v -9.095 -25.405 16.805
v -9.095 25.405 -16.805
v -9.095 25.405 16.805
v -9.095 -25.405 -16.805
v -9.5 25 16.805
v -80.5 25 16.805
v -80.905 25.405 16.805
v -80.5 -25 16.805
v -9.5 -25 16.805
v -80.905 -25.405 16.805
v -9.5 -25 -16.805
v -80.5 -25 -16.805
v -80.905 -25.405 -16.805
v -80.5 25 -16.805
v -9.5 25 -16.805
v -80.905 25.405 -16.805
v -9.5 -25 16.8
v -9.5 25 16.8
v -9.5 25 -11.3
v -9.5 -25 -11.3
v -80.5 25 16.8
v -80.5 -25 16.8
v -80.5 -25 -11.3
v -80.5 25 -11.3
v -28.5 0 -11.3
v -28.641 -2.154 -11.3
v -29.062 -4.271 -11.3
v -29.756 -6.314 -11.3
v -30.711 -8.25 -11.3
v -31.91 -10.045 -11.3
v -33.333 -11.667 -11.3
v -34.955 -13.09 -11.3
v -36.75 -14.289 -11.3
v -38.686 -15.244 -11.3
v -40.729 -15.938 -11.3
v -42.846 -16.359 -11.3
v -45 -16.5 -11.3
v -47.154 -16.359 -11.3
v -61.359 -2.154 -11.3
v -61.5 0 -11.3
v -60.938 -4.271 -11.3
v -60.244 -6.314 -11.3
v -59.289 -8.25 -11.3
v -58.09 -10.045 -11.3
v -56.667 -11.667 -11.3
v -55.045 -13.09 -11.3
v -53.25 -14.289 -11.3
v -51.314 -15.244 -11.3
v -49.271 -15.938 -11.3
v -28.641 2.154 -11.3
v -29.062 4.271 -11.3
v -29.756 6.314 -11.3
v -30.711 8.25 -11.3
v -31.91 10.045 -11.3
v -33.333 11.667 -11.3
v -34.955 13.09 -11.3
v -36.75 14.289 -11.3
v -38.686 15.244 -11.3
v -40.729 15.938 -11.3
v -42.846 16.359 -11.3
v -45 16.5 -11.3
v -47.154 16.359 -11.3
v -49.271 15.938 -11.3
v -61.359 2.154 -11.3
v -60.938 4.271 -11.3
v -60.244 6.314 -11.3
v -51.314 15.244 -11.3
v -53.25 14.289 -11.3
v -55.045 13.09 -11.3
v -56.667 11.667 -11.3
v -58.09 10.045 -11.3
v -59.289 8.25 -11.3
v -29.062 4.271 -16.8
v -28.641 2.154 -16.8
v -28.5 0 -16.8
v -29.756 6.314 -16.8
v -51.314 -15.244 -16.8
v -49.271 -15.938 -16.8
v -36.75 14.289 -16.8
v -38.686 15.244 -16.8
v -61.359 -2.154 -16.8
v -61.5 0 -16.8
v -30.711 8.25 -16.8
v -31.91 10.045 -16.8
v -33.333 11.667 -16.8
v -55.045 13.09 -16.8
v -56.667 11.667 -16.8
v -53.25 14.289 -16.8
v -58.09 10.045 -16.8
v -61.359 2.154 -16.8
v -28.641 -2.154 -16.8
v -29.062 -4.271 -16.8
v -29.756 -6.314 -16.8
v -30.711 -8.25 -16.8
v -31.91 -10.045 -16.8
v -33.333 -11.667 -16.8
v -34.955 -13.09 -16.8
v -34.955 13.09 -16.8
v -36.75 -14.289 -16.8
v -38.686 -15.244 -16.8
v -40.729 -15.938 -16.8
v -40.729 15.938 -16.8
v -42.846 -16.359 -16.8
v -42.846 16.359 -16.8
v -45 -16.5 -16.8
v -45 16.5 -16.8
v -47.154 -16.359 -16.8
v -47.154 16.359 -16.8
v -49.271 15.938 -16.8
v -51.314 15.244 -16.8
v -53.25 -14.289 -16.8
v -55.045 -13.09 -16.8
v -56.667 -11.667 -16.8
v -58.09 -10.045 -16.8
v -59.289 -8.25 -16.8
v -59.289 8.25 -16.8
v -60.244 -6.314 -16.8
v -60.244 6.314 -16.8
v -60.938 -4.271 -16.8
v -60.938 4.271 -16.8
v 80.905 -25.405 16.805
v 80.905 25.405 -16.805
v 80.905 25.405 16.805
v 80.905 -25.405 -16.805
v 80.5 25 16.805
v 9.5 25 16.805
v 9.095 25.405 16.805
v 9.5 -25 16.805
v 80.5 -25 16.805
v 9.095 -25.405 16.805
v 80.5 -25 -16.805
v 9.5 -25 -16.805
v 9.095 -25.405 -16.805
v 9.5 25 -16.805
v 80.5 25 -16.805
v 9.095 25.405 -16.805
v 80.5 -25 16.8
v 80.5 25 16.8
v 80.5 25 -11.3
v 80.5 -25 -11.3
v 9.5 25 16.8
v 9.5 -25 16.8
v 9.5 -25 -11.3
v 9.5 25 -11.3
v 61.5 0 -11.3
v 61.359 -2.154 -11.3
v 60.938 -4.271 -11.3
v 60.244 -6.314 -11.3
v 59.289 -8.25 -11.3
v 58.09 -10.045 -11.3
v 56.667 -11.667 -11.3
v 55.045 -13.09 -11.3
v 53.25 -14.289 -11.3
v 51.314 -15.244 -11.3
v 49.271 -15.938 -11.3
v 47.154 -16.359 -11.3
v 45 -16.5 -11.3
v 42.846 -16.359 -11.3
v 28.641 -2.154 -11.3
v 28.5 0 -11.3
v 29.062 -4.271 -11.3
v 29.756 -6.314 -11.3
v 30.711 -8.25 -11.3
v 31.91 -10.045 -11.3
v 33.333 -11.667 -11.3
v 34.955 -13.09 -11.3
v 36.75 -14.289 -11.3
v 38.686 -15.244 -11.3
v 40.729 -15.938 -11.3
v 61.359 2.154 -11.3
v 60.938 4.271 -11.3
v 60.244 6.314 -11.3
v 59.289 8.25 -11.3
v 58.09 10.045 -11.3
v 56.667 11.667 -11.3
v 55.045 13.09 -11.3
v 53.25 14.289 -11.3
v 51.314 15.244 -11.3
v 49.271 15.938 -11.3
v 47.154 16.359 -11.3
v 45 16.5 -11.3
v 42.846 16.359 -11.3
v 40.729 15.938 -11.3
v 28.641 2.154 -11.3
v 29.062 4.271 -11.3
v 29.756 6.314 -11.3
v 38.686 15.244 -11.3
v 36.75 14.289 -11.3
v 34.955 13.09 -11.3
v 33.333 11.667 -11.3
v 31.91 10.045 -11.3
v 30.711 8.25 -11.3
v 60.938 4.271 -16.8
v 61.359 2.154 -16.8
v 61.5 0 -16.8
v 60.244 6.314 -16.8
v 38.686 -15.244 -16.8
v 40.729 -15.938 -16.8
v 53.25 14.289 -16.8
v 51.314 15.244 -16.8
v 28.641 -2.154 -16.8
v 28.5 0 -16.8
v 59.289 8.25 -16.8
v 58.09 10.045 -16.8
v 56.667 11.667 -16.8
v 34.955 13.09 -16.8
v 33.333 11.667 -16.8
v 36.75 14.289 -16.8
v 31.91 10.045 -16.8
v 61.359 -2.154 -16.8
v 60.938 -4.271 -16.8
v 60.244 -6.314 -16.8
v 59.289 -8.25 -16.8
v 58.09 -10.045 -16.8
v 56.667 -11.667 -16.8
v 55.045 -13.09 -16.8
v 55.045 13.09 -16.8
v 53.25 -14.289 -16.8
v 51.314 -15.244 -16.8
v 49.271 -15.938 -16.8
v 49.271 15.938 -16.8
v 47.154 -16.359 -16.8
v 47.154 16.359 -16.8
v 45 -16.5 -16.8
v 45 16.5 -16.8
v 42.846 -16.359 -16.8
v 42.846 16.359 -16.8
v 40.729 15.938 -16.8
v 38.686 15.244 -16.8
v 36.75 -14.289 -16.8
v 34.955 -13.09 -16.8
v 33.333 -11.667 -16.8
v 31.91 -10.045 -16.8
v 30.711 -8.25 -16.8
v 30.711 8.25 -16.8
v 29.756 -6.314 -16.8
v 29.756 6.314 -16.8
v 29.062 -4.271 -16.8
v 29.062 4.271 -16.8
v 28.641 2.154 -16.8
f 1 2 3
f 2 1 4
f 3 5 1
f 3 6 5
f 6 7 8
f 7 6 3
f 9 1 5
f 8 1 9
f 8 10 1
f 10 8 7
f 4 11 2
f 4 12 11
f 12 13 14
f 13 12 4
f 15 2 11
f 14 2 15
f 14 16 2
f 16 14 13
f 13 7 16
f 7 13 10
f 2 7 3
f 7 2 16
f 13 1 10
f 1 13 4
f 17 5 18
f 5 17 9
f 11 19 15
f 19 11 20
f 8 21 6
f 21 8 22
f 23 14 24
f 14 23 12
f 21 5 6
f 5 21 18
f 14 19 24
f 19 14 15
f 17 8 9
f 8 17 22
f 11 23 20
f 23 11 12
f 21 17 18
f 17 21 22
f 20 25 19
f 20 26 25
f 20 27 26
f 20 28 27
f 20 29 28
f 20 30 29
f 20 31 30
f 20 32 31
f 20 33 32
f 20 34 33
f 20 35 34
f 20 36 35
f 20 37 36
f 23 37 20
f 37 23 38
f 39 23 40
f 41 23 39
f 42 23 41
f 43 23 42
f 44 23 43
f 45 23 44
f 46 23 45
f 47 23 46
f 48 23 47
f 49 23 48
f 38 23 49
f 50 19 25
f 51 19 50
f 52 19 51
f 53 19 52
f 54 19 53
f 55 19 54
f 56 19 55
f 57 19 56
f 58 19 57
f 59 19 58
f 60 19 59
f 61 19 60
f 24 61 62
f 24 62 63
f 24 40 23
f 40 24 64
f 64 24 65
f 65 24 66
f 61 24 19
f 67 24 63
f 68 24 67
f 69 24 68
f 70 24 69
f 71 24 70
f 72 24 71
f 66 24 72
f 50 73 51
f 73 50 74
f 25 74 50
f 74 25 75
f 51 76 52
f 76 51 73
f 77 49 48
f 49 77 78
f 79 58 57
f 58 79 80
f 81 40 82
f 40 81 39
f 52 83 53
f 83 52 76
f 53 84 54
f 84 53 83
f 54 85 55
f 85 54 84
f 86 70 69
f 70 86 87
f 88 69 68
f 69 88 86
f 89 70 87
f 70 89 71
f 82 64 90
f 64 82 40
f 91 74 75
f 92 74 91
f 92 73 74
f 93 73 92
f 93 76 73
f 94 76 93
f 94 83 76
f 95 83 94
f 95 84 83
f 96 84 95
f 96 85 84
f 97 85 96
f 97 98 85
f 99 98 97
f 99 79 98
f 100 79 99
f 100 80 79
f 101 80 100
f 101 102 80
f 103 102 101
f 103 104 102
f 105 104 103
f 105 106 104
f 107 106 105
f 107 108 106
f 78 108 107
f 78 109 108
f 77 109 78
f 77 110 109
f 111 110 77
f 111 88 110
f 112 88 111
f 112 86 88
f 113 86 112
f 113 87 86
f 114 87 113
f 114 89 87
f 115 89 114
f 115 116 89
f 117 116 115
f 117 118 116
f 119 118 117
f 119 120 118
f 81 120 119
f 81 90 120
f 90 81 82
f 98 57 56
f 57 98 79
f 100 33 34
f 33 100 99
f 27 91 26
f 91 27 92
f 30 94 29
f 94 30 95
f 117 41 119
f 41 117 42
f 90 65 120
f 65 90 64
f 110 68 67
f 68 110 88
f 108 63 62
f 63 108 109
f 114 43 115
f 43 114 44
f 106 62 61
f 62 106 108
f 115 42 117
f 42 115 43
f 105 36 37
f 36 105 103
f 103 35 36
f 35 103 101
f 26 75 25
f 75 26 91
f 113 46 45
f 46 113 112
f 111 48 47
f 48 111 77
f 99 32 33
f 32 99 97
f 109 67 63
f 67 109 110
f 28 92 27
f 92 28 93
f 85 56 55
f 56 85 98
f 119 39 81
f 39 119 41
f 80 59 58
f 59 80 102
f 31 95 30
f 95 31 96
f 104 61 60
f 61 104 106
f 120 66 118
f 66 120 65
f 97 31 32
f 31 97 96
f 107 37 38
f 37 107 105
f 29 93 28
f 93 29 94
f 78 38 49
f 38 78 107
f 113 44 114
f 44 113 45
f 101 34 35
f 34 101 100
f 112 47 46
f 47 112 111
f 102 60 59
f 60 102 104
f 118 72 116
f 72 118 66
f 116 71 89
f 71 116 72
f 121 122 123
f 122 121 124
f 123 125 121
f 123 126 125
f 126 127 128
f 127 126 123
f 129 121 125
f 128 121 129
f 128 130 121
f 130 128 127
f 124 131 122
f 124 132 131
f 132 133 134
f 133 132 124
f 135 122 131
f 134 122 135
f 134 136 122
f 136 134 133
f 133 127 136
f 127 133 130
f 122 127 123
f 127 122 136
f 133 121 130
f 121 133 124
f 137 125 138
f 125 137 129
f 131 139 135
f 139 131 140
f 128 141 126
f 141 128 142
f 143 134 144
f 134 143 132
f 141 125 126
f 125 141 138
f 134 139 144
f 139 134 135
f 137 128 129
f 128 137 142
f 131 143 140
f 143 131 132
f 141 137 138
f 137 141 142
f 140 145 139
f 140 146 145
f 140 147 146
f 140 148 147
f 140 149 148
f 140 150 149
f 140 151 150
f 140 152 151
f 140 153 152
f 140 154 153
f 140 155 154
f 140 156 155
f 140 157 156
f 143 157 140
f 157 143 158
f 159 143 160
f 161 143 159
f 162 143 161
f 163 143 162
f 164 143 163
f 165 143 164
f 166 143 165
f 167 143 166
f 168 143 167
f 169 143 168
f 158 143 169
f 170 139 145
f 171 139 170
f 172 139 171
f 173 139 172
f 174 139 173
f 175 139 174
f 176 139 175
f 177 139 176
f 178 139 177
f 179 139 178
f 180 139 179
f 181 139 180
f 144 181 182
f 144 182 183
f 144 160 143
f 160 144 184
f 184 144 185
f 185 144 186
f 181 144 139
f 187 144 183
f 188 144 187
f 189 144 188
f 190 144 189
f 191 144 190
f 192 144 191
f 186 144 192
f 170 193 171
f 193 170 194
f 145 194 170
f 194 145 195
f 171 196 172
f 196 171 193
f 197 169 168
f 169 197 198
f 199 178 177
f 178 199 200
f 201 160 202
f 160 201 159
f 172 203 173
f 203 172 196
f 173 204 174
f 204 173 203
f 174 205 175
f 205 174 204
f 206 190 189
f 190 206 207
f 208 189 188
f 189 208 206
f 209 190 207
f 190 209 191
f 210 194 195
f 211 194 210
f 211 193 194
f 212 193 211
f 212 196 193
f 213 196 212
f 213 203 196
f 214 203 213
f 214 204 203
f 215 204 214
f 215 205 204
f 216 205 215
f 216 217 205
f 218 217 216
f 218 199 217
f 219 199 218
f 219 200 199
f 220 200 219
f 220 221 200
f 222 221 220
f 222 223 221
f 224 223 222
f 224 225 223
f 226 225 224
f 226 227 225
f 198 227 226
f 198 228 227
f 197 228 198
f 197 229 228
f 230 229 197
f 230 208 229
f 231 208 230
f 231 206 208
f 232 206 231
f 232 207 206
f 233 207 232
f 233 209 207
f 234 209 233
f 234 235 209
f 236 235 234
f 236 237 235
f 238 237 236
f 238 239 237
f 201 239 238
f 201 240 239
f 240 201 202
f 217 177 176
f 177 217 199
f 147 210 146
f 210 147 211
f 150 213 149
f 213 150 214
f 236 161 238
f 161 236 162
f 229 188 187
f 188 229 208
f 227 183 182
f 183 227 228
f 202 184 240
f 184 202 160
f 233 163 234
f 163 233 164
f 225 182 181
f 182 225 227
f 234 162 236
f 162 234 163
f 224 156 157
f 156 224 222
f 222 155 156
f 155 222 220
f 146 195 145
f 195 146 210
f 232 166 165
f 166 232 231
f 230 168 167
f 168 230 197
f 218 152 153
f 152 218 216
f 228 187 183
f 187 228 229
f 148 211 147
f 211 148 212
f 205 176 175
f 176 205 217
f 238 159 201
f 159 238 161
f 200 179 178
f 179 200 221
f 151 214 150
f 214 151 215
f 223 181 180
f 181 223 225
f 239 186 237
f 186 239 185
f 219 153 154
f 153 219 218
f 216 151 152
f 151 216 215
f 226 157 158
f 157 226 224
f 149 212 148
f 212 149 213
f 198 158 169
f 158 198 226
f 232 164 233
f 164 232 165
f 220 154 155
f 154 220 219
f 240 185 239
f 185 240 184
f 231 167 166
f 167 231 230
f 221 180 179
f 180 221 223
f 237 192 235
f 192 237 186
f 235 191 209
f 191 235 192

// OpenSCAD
// Boat Puck — H9–13 cavity packing mockups
// Units: mm.  +Z toward backdoor; −Z toward lens/GPS.
// Open in OpenSCAD; set show = "puck" | "screen" | "both"

cam_W = 71.8;
cam_H = 50.8;
cam_D = 33.6;
lens_OD = 33.0;
lens_protrusion = 5.5;
$fn = 48;

/* [Which insert] */
show = "both"; // ["puck", "screen", "both"]

module camera_body_behind_lens() {
  d = cam_D - lens_protrusion;
  translate([0, 0, lens_protrusion / 2])
    cube([cam_W, cam_H, d], center = true);
}

module lens_boss() {
  translate([0, 0, -cam_D / 2 + lens_protrusion / 2])
    cylinder(h = lens_protrusion, d = lens_OD, center = true);
}

module lipo(w, h, t) {
  color([0.15, 0.15, 0.18]) cube([w, h, t], center = true);
}

module pcb(w, h, t) {
  color([0.1, 0.45, 0.2]) cube([w, h, t], center = true);
}

module module_chip(w, h, t) {
  color([0.2, 0.2, 0.25]) cube([w, h, t], center = true);
}

module lcd_panel(w, h, t) {
  color([0.05, 0.35, 0.55]) cube([w, h, t], center = true);
}

module lcd_aa(w, h, t) {
  color([0.15, 0.75, 0.95, 0.85]) cube([w, h, t], center = true);
}

module puck_insert() {
  color([0.5, 0.7, 0.95, 0.12]) camera_body_behind_lens();
  color([0.95, 0.55, 0.15, 0.25]) lens_boss();

  translate([0, 0, -cam_D / 2 + 2.5])
    color([0.85, 0.85, 0.9]) cylinder(h = 4.0, d = 25, center = true);

  translate([0, 0, -cam_D / 2 + lens_protrusion + 2.0])
    pcb(28, 28, 3.0);

  translate([-20, 12, -2]) module_chip(18, 16, 3.0);
  translate([-20, -12, -2]) module_chip(12, 12, 2.0);
  translate([18, 10, -2]) module_chip(20, 18, 3.0);

  translate([0, 0, 8]) lipo(60, 40, 8);
  translate([0, 0, 2.5]) pcb(65, 45, 1.6);
}

module screen_insert() {
  color([0.5, 0.7, 0.95, 0.12]) camera_body_behind_lens();
  color([0.95, 0.55, 0.15, 0.15]) lens_boss();

  translate([0, 0, cam_D / 2 - 2.0]) lcd_panel(58, 35, 2.5);
  translate([0, 0, cam_D / 2 - 0.6]) lcd_aa(40.8, 30.6, 0.8);

  translate([18, -12, 0]) module_chip(18, 16, 3.0);
  translate([-8, 0, -4]) lipo(45, 30, 6);
  translate([0, 0, 4]) pcb(60, 40, 1.6);
}

module cavity_wireframe() {
  color([0.2, 0.2, 0.2, 0.35])
    difference() {
      cube([cam_W + 0.01, cam_H + 0.01, cam_D + 0.01], center = true);
      cube([cam_W - 0.8, cam_H - 0.8, cam_D + 1], center = true);
    }
}

if (show == "puck" || show == "both") {
  translate(show == "both" ? [-45, 0, 0] : [0, 0, 0]) {
    cavity_wireframe();
    puck_insert();
  }
}

if (show == "screen" || show == "both") {
  translate(show == "both" ? [45, 0, 0] : [0, 0, 0]) {
    cavity_wireframe();
    screen_insert();
  }
}

echo("PUCK: GPS Ø25x4 + GNSS 28x28x3 + LoRa/IMU/MCU + LiPo 60x40x8");
echo("SCREEN: LCD 58x35 + AA 40.8x30.6 + MCU + LiPo 45x30x6");
echo(str("CAVITY ", cam_W, "x", cam_H, "x", cam_D));
